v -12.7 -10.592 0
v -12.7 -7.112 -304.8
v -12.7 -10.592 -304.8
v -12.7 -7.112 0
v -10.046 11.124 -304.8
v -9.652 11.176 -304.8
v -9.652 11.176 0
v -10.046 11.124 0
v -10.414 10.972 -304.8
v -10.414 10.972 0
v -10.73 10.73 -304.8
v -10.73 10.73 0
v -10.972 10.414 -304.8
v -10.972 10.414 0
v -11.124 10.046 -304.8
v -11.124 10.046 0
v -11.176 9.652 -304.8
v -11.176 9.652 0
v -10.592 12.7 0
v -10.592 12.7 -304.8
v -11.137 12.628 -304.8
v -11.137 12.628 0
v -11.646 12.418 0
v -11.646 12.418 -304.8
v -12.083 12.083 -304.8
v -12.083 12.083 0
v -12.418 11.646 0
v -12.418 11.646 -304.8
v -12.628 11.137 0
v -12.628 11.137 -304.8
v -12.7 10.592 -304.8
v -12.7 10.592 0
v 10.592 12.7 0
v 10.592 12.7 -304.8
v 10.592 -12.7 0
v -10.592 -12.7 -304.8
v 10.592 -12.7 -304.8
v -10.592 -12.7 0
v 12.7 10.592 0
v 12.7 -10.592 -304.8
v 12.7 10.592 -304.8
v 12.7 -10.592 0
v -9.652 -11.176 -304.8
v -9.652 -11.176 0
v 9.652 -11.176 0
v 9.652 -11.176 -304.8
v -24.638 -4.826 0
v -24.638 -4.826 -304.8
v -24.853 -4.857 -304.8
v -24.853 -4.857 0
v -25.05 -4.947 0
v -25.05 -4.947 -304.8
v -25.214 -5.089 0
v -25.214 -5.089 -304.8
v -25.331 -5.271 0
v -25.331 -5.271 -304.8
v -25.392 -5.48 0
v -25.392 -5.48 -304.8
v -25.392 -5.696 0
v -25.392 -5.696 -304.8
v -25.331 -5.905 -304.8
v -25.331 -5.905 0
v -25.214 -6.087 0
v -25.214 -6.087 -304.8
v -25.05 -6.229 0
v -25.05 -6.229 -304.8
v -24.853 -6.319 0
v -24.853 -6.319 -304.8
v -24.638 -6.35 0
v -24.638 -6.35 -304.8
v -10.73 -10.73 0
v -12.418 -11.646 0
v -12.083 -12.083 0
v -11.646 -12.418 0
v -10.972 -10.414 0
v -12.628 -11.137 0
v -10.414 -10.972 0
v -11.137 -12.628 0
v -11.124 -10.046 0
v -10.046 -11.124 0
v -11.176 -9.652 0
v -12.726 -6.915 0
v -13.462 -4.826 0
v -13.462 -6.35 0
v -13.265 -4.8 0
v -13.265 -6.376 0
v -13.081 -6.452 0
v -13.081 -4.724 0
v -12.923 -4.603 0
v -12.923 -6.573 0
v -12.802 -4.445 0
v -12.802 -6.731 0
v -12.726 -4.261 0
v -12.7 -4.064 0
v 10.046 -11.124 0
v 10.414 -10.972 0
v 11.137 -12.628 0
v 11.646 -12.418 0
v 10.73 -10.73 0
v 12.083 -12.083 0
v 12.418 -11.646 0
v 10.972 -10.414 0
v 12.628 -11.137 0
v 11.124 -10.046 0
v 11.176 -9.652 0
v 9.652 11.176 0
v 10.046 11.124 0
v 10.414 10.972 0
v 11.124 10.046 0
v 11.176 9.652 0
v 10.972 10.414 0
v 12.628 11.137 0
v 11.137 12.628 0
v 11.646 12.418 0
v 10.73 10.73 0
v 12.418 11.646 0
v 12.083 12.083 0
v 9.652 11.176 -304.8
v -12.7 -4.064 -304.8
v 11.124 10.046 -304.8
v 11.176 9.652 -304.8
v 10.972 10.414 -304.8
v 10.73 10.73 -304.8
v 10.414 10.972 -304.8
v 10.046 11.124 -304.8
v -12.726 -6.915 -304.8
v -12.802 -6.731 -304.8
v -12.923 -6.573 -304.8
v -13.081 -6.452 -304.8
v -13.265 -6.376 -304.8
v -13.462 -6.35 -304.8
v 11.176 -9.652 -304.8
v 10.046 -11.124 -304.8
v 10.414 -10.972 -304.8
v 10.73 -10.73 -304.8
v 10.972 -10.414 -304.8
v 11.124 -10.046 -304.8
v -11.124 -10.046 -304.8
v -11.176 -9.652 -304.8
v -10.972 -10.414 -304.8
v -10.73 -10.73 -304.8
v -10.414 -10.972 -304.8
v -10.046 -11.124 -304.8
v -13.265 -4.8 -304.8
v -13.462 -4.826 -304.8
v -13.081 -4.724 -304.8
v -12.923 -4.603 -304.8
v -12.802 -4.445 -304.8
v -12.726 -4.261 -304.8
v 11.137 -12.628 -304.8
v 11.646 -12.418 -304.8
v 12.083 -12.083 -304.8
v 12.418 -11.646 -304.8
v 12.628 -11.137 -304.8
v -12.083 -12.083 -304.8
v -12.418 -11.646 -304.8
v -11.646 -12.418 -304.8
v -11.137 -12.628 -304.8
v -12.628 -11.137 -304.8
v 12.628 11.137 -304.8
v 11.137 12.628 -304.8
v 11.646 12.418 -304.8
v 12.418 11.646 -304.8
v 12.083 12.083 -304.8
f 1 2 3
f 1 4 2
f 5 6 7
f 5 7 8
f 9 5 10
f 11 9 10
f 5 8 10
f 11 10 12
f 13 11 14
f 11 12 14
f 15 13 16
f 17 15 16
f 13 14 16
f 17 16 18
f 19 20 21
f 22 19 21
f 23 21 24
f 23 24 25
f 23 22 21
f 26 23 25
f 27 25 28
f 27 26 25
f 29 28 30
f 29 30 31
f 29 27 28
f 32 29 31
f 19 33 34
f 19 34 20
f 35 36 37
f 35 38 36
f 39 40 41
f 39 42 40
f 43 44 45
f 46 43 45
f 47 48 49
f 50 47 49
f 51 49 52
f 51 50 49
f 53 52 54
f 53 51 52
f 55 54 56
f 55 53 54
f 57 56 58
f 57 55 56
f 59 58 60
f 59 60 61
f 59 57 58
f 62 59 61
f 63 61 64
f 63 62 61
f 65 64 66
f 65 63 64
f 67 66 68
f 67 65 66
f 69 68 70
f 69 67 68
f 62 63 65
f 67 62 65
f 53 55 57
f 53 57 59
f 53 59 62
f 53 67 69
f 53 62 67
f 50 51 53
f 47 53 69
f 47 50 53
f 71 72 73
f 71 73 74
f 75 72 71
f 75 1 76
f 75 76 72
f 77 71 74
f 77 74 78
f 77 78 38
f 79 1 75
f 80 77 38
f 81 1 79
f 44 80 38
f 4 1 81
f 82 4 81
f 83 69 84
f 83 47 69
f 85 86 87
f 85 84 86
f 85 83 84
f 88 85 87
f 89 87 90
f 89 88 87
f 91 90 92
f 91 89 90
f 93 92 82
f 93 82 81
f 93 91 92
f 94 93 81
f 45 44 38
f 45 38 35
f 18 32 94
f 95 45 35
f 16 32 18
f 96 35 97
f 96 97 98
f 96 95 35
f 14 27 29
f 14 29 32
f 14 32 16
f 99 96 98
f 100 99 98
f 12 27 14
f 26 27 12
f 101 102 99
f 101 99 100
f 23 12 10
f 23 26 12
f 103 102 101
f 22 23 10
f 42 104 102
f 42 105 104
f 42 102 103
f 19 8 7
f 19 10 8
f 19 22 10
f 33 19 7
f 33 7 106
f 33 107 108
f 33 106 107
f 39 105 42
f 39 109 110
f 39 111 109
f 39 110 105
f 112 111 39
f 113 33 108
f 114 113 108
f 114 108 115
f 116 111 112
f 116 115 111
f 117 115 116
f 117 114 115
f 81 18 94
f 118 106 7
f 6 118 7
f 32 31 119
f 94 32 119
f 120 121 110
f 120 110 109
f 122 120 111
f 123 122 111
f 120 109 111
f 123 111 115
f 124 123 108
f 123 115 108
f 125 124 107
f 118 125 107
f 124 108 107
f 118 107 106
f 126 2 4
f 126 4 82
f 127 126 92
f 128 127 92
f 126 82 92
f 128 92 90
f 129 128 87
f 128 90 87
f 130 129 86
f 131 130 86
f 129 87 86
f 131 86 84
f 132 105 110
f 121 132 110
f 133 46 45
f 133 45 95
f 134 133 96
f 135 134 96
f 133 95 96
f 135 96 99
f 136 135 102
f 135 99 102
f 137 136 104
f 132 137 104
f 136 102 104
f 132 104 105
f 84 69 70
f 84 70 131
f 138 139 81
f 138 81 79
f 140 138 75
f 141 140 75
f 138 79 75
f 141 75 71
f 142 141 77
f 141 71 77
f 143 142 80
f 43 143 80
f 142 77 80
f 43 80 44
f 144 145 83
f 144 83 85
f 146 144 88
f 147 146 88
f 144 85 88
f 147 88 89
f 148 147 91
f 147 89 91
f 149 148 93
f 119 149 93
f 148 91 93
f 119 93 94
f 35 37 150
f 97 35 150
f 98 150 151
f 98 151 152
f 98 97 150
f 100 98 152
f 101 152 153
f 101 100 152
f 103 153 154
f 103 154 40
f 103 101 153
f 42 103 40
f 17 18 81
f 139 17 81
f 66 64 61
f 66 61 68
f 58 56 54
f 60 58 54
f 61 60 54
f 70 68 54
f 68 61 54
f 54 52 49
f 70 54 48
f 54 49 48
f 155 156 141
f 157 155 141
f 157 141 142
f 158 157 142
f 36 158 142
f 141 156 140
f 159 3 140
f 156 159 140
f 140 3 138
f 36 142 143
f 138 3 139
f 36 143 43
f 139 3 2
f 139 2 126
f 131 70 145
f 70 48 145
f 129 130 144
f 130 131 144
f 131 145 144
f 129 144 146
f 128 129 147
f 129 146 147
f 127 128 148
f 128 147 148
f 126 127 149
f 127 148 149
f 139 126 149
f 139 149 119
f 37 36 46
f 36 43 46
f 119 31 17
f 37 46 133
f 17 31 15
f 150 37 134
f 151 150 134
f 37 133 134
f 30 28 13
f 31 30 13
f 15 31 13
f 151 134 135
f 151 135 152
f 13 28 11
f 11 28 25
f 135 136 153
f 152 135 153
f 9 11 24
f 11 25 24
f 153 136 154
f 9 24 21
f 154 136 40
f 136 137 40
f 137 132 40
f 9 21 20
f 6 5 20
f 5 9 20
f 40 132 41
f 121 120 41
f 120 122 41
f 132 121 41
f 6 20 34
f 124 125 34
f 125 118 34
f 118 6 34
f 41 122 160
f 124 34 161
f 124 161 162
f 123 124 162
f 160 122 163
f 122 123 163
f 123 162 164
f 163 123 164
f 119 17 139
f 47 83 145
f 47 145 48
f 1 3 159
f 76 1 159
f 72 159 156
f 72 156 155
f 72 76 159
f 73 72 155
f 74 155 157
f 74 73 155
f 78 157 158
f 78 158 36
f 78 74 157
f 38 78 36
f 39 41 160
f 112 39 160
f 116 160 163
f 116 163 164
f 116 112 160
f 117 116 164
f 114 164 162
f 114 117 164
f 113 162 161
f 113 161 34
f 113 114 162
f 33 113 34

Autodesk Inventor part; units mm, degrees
ref_plane "YZ Plane" through (0, 0, 0) normal (1, 0, 0) x (0, 1, 0)
ref_plane "XZ Plane" through (0, 0, 0) normal (0, 1, 0) x (-1, 0, 0)
ref_plane "XY Plane" through (0, 0, 0) normal (0, 0, 1) x (1, 0, 0)
sketch "Sketch1" plane through (0, 0, 0) normal (0, 0, 1) x (1, 0, 0)
  arc A0 (9.652, -11.176) -> (11.176, -9.652) centre (9.652, -9.652) ccw
  line L0 (-9.652, -11.176) -> (9.652, -11.176)
  arc A1 (-11.176, -9.652) -> (-9.652, -11.176) centre (-9.652, -9.652) ccw
  line L1 (-11.176, 9.652) -> (-11.176, -9.652)
  arc A2 (-9.652, 11.176) -> (-11.176, 9.652) centre (-9.652, 9.652) ccw
  line L2 (9.652, 11.176) -> (-9.652, 11.176)
  arc A3 (11.176, 9.652) -> (9.652, 11.176) centre (9.652, 9.652) ccw
  line L3 (11.176, -9.652) -> (11.176, 9.652)
  arc A4 (-12.7, -7.112) -> (-13.462, -6.35) centre (-13.462, -7.112) ccw
  line L4 (-12.7, -7.112) -> (-12.7, -10.5918)
  arc A5 (-12.7, -10.5918) -> (-10.5918, -12.7) centre (-10.5918, -10.5918) ccw
  line L5 (-10.5918, -12.7) -> (10.5918, -12.7)
  arc A6 (10.5918, -12.7) -> (12.7, -10.5918) centre (10.5918, -10.5918) ccw
  line L6 (12.7, -10.5918) -> (12.7, 10.5918)
  arc A7 (12.7, 10.5918) -> (10.5918, 12.7) centre (10.5918, 10.5918) ccw
  line L7 (10.5918, 12.7) -> (-10.5918, 12.7)
  arc A8 (-10.5918, 12.7) -> (-12.7, 10.5918) centre (-10.5918, 10.5918) ccw
  line L8 (-12.7, 10.5918) -> (-12.7, -4.064)
  arc A9 (-13.462, -4.826) -> (-12.7, -4.064) centre (-13.462, -4.064) ccw
  line L9 (-13.462, -4.826) -> (-24.638, -4.826)
  arc A10 (-24.638, -4.826) -> (-24.638, -6.35) centre (-24.638, -5.588) ccw
  line L10 (-24.638, -6.35) -> (-13.462, -6.35)
  point P0 (0, 0)
extrude "Extrusion1" add sketch "Sketch1" against normal blind 304.8
properties part number "9005"
